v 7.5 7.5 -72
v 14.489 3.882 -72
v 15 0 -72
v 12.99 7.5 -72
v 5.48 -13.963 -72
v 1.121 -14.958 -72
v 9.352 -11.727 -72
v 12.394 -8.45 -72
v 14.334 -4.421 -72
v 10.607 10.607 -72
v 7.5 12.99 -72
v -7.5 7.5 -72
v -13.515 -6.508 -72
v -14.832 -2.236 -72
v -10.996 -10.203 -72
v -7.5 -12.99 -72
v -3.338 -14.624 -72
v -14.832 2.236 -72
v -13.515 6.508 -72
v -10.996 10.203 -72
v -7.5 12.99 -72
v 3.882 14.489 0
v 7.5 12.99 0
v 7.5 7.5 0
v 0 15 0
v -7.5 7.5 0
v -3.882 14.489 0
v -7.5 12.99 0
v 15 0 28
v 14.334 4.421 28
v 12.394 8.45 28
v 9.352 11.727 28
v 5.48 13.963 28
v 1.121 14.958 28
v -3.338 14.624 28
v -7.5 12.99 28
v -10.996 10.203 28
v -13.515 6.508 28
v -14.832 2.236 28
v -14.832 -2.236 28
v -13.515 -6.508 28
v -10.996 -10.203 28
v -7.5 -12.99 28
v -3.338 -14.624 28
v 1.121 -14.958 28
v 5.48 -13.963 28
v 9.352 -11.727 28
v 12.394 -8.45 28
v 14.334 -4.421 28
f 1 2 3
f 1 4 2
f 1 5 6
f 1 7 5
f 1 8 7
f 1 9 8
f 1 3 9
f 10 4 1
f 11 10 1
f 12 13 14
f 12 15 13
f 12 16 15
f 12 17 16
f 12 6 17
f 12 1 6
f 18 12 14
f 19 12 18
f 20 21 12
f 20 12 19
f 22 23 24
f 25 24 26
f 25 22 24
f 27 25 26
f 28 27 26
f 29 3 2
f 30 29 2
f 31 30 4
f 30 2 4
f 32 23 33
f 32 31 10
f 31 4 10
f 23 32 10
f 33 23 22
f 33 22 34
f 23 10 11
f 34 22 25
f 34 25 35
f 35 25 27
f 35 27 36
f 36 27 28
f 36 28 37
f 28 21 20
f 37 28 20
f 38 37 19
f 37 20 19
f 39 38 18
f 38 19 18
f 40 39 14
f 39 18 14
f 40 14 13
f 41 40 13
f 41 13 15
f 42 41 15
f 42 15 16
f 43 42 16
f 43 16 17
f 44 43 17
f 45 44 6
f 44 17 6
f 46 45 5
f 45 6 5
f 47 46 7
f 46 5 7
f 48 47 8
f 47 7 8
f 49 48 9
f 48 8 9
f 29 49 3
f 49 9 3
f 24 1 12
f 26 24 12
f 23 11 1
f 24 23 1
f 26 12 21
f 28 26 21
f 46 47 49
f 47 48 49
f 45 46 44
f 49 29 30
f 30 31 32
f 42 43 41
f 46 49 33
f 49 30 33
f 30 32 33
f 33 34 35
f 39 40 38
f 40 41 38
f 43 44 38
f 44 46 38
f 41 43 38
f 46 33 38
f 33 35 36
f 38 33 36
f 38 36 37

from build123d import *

# Parameters (mm, degrees)
SKETCH1_W          = 15
SKETCH1_H          = 100
CUT_EXTRUDE1_DEPTH = 72


with BuildPart() as part:
    # Sketch1 → Revolve1 (revolve)
    with BuildSketch(Plane(origin=(0, 0, 0), x_dir=(1, 0, 0), z_dir=(0, 1, 0))):
        with Locations((7.5, 22)):
            Rectangle(SKETCH1_W, SKETCH1_H)
    revolve(axis=Axis((0, 0, -72), (0, 0, 1)))

    # Sketch2 → Cut-Extrude1 (cut)
    with BuildSketch(Plane(origin=(0, 0, -72), x_dir=(-1, 0, 0), z_dir=(0, 0, -1))):
        with BuildLine():
            Line((-7.5, 12.990381057), (-7.5, 7.5))
            Line((-7.5, 7.5), (7.5, 7.5))
            Line((7.5, 7.5), (7.5, 12.990381057))
            ThreePointArc((7.5, 12.990381057), (0, 15), (-7.5, 12.990381057))
        make_face()
    extrude(amount=-CUT_EXTRUDE1_DEPTH, mode=Mode.SUBTRACT)


solid = part.part
